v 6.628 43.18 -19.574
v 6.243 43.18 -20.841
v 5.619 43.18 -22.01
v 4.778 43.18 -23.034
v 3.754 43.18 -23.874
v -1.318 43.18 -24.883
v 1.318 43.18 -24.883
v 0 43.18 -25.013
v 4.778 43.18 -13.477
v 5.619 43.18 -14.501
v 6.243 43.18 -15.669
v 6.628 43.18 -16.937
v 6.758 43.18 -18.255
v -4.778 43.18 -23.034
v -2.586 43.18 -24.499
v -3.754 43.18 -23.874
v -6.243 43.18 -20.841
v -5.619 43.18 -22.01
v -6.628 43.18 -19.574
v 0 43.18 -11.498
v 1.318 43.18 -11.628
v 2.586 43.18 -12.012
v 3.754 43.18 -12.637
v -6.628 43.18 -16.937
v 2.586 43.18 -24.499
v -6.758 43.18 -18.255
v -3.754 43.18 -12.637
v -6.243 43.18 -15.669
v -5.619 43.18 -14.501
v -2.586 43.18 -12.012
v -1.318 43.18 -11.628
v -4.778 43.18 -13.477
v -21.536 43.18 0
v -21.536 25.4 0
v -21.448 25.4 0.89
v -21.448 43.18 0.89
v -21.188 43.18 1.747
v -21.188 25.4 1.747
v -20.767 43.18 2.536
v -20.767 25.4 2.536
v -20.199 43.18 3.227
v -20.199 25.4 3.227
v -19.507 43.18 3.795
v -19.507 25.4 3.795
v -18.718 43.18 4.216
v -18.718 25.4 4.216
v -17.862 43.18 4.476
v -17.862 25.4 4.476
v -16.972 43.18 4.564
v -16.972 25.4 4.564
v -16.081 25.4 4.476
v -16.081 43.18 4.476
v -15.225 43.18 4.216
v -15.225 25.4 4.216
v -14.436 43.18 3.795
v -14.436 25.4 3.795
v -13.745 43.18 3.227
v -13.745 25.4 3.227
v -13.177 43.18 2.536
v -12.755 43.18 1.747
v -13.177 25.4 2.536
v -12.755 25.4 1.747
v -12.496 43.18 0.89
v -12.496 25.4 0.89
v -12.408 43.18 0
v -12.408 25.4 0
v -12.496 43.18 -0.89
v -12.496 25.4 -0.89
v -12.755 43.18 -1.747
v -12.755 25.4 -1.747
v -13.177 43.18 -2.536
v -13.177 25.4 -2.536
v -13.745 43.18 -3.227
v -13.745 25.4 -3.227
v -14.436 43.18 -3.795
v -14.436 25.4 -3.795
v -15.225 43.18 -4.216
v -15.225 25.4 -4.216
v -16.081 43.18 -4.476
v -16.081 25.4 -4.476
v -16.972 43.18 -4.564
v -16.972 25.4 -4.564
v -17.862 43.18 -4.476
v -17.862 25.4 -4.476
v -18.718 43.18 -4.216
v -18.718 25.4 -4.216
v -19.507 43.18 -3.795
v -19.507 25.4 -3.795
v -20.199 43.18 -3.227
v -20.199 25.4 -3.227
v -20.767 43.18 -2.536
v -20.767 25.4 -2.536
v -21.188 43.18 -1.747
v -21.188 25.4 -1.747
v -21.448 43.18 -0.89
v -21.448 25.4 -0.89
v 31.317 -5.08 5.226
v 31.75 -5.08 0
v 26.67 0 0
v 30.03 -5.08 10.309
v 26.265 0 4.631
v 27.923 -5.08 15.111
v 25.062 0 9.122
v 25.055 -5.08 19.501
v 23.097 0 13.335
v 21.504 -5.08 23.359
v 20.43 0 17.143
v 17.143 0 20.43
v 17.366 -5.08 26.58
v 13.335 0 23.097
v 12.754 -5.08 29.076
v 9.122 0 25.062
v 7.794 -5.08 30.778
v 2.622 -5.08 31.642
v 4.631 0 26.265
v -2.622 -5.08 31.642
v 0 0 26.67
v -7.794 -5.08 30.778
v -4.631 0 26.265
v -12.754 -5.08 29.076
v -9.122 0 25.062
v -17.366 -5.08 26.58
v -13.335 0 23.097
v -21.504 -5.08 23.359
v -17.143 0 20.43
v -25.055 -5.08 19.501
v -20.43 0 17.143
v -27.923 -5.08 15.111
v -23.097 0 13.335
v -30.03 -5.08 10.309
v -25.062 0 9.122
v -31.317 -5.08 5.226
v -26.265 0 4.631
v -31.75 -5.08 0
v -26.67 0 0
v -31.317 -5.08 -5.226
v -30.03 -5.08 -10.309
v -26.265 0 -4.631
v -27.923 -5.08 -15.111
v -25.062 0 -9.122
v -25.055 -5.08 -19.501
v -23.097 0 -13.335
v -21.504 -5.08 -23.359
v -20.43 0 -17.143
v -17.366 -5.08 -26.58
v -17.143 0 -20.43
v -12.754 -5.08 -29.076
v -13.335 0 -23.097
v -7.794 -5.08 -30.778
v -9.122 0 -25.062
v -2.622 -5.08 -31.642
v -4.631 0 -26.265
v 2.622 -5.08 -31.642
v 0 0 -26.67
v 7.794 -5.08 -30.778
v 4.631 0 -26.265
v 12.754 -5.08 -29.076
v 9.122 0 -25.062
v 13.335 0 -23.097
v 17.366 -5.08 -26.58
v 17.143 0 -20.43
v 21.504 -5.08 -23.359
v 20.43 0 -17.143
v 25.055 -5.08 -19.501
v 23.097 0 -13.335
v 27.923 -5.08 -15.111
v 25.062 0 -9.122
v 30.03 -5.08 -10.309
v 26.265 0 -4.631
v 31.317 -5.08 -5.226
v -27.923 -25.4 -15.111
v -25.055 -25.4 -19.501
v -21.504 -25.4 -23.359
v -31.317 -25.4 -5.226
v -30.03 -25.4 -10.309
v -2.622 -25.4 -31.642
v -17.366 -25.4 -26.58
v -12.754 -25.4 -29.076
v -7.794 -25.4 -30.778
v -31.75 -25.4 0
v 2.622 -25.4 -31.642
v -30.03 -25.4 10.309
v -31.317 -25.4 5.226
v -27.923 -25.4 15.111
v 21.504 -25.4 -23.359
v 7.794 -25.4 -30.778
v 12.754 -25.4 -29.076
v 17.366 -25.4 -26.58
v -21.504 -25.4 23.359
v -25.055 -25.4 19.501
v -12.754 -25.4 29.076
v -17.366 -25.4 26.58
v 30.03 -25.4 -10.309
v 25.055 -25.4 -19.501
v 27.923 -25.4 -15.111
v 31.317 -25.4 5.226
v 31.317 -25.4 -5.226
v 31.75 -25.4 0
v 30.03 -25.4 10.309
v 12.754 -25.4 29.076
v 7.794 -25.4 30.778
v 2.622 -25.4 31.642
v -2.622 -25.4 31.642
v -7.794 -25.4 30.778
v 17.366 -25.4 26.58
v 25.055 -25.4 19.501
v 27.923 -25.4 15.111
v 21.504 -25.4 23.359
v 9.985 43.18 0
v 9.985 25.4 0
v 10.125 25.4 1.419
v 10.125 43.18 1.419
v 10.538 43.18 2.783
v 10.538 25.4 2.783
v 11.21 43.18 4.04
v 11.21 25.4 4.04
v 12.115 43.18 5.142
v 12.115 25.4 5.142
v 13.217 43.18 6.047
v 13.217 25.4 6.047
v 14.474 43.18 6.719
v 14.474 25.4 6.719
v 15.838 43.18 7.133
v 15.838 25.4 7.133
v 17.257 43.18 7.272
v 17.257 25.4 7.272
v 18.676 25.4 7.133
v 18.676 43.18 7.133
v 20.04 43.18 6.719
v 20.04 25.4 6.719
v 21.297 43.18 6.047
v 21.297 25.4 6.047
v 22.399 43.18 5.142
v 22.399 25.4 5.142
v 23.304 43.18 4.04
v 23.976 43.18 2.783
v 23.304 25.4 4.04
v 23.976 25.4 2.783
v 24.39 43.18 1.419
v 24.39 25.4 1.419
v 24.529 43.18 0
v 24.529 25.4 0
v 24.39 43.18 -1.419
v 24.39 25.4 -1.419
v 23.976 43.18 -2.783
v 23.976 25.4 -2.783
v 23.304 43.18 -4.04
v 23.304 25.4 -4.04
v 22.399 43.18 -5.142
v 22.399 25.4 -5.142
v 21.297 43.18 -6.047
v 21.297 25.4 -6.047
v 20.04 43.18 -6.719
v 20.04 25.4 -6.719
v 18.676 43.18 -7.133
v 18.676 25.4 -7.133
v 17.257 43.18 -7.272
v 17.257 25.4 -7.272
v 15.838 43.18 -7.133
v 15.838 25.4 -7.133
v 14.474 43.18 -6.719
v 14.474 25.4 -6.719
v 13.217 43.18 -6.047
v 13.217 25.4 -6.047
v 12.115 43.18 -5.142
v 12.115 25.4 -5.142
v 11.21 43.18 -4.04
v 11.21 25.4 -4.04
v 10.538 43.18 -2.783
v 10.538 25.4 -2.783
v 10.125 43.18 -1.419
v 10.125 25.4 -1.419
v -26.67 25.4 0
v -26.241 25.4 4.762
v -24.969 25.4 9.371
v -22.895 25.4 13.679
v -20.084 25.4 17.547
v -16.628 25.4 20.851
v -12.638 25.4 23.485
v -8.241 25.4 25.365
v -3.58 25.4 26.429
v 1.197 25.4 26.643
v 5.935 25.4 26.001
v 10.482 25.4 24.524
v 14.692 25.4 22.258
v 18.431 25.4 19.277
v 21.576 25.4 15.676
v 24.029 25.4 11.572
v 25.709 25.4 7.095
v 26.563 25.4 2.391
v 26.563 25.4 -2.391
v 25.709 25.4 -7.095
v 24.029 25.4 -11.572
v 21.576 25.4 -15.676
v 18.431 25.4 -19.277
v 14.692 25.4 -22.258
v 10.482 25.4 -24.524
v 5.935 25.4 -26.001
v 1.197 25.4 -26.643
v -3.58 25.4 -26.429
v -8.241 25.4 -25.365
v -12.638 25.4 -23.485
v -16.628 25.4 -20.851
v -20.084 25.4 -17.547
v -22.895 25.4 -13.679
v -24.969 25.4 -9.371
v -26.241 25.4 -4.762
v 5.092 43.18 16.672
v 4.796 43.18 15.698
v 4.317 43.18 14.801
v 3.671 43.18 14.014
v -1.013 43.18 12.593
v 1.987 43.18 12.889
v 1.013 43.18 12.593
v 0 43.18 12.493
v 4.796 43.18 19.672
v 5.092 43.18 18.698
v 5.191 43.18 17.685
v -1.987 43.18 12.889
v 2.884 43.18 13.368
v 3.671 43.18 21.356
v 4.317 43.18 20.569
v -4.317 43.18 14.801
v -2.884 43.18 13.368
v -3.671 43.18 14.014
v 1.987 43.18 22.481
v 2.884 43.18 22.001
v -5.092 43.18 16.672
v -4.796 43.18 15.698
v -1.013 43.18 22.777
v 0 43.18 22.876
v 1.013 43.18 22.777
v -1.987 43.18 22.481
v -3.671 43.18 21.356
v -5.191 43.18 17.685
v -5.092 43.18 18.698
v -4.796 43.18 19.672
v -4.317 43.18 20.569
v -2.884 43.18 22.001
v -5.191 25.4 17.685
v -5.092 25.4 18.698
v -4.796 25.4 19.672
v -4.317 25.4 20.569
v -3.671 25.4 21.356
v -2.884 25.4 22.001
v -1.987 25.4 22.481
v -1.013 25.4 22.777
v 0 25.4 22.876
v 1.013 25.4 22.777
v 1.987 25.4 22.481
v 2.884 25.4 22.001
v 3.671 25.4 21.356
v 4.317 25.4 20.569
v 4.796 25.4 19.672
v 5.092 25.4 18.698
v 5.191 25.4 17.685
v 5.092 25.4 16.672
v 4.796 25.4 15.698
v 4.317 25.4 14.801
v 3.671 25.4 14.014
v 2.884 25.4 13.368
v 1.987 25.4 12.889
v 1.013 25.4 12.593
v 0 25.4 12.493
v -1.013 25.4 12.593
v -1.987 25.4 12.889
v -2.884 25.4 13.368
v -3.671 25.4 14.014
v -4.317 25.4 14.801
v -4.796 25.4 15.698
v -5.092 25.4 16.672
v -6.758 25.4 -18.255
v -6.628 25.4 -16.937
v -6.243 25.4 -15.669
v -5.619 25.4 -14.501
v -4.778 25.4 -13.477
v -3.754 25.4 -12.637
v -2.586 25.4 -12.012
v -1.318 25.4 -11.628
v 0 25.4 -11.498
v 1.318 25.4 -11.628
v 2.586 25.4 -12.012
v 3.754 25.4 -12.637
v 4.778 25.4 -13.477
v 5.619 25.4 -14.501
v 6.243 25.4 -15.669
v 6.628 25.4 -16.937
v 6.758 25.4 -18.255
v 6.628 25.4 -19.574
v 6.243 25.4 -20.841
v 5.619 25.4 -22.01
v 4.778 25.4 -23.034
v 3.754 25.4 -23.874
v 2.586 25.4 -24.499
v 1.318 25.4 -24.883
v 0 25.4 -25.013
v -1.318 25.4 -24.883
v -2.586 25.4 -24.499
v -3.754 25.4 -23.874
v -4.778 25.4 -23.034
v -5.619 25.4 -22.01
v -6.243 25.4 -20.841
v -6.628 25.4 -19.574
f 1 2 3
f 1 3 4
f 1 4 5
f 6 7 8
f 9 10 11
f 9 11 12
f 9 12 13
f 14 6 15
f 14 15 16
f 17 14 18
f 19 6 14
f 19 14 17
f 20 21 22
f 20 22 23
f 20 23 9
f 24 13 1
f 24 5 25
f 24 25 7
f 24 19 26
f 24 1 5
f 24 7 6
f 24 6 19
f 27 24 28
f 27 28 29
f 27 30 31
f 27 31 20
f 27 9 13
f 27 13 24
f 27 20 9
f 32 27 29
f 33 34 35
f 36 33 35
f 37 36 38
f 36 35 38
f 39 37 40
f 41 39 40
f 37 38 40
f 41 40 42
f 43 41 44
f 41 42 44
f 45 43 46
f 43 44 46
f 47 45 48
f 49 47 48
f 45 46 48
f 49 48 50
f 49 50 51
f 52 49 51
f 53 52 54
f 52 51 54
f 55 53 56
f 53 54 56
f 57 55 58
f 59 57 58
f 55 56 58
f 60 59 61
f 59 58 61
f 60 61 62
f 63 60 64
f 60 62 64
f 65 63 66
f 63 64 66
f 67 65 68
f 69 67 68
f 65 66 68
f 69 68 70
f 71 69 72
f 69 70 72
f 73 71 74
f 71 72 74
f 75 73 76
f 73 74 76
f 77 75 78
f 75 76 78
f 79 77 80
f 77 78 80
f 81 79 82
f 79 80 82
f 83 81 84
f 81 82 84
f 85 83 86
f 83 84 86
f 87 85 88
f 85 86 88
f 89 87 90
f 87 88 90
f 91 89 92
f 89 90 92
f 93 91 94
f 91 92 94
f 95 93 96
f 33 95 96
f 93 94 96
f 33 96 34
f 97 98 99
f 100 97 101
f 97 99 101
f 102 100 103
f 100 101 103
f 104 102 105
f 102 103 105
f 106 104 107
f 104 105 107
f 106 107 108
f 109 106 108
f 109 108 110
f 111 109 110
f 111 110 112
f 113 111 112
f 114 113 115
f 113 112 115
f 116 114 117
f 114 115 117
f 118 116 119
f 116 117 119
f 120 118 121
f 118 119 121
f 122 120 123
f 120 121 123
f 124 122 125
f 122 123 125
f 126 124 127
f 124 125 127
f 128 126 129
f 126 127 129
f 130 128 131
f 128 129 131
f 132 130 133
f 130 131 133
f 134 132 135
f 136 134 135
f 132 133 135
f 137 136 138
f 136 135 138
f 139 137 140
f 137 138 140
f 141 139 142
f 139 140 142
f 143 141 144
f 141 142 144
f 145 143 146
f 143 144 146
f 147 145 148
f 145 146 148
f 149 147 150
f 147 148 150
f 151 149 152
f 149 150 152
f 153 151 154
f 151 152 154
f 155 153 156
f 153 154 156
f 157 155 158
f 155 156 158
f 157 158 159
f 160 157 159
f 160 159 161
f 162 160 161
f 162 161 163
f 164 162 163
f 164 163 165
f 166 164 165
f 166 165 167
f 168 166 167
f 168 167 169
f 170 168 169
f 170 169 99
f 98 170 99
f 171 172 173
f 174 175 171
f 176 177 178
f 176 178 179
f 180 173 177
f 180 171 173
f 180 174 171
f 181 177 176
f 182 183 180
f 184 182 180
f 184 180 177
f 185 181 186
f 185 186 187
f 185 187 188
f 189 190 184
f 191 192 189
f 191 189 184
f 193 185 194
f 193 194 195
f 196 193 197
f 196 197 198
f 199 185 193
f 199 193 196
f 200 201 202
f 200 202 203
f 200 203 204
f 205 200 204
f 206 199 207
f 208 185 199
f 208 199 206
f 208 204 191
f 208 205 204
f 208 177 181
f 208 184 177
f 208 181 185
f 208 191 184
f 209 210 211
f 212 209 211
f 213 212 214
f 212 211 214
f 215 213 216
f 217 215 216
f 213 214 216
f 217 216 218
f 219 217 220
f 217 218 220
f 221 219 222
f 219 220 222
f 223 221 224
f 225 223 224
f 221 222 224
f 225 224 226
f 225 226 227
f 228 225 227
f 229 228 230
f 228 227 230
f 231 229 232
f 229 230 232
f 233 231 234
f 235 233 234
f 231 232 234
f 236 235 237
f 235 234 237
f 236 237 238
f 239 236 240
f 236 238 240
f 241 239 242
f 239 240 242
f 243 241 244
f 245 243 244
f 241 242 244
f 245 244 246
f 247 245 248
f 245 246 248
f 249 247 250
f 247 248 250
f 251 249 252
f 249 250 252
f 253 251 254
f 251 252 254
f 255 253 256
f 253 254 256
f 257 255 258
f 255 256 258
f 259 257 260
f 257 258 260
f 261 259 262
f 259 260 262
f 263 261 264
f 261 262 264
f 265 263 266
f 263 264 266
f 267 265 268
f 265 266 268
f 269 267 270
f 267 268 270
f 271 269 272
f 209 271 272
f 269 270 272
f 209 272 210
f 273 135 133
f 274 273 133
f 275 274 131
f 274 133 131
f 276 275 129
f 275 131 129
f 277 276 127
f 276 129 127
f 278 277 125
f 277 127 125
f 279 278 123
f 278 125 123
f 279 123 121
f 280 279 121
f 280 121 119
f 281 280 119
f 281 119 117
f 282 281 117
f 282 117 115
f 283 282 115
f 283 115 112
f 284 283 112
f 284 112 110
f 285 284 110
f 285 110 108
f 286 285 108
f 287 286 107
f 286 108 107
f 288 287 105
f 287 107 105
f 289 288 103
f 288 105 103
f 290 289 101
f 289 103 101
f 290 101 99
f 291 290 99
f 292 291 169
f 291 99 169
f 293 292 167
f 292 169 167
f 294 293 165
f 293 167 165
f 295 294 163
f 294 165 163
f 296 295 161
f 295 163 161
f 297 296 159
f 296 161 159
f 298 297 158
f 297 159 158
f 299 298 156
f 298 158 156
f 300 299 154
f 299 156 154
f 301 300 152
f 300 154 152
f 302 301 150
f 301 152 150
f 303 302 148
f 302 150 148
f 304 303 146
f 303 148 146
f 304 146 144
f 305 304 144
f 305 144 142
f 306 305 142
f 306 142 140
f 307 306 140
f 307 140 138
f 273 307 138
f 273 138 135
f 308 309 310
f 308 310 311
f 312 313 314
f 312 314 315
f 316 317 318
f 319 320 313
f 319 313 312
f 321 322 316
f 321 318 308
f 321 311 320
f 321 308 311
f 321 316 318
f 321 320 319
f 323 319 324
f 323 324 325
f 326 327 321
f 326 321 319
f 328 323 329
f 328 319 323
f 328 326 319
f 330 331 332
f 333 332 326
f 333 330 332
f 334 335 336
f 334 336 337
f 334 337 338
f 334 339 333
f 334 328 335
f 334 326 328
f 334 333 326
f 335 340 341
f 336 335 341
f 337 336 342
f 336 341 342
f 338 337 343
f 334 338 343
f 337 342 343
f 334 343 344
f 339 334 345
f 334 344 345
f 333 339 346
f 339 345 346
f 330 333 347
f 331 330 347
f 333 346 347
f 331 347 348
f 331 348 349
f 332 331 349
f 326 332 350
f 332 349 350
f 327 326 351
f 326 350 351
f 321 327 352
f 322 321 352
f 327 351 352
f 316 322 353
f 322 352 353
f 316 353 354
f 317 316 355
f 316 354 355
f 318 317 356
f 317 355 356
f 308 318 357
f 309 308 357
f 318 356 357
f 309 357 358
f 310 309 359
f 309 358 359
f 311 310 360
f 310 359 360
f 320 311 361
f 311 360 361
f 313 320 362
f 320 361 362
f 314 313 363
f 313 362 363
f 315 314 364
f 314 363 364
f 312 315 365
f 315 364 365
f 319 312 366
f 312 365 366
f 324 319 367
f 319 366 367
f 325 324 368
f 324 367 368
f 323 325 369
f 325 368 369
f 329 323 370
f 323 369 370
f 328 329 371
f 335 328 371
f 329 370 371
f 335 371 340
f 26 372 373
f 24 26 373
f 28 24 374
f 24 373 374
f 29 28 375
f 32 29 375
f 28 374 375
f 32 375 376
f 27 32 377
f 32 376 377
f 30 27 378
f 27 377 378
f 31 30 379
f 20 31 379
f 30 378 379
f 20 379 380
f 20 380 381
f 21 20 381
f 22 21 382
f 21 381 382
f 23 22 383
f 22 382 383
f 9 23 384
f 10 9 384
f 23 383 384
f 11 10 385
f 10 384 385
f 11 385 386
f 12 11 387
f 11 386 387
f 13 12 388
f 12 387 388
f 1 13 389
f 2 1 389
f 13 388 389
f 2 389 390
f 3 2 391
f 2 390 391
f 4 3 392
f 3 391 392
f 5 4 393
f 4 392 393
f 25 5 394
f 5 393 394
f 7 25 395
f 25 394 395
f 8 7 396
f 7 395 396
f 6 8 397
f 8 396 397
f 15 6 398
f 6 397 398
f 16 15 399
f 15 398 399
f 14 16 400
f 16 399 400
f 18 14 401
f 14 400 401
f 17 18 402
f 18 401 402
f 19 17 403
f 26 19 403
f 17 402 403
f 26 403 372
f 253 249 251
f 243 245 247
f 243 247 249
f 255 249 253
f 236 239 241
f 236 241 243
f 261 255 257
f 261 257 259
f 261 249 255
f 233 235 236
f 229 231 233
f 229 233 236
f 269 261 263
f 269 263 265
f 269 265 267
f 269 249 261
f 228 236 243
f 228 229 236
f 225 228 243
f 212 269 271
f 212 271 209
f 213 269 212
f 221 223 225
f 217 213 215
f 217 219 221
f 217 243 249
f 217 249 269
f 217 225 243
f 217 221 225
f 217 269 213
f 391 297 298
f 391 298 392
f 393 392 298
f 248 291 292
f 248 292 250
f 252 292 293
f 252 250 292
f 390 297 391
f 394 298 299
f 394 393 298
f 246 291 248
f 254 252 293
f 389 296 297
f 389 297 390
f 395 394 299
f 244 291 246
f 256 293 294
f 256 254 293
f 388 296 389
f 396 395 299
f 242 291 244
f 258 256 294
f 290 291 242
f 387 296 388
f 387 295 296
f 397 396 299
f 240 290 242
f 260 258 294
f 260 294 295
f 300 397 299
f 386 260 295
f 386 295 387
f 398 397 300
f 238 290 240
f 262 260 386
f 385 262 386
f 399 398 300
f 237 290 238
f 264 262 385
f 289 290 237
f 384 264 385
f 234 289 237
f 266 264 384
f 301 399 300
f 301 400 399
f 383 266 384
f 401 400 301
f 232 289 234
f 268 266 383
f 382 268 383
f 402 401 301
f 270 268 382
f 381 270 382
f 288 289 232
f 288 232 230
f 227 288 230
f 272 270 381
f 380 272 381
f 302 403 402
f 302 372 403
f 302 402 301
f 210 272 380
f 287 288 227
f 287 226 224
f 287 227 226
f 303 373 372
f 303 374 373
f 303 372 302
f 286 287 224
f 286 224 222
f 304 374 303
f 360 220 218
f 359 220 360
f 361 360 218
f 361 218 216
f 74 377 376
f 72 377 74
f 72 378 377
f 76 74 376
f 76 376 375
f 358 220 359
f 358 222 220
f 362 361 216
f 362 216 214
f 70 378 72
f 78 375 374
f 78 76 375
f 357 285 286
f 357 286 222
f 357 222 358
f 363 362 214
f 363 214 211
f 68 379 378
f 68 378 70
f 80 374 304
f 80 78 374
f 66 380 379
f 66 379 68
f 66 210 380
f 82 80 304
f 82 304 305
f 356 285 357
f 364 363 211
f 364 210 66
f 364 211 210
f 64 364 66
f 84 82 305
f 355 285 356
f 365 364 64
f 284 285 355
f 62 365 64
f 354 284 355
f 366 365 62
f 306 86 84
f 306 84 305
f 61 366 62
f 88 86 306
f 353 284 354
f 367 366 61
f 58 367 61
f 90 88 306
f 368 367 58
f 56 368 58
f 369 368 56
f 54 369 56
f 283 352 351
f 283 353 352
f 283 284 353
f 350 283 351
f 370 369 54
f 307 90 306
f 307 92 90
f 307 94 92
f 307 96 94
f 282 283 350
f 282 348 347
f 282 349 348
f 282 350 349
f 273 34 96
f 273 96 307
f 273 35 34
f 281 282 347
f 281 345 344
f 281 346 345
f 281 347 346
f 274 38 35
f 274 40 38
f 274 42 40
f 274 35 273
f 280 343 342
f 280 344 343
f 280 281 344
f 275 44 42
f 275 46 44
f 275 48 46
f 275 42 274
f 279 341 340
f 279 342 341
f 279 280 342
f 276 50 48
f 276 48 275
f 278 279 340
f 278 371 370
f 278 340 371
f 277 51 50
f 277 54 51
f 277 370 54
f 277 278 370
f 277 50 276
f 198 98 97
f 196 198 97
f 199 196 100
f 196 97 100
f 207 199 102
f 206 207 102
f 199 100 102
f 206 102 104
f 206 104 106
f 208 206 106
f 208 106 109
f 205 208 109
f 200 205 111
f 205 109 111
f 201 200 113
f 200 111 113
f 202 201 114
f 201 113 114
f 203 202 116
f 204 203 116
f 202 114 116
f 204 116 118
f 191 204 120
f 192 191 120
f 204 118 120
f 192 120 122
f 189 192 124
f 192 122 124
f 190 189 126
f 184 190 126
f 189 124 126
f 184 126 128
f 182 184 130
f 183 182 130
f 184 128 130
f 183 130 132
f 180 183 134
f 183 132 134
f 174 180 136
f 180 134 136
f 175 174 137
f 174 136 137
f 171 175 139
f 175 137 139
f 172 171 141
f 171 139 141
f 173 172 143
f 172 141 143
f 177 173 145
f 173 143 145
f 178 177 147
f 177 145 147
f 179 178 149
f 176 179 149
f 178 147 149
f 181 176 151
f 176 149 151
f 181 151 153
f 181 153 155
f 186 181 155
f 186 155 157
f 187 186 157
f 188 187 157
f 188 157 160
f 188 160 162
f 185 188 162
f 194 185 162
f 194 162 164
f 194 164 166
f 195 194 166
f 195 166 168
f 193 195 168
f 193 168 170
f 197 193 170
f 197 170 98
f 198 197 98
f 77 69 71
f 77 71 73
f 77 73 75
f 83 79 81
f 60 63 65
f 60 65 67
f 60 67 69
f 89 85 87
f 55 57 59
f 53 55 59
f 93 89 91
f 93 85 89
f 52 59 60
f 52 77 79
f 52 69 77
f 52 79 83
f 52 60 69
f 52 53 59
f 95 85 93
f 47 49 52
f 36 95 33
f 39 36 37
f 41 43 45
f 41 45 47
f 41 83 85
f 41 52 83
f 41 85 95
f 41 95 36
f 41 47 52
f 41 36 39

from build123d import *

# Parameters (mm, degrees)
F0_R     = 31.75
F1_DEPTH = 25.4
F3_SIZE  = 5.08
F4_R     = 26.67
F5_DEPTH = 25.4
F6_R     = 5.19146
F6_R_2   = 7.272236
F6_R_3   = 6.757556
F6_R_4   = 4.56385
F7_DEPTH = 17.78


with BuildPart() as f1:
    # F0 (on Front) → F1 (new body)
    with BuildSketch(Plane.XZ):
        Circle(F0_R)
    extrude(amount=F1_DEPTH)

    # F3
    f3_edges = [f1.edges().sort_by_distance(p)[0] for p in [
        (-31.75, 0, 0),
    ]]
    chamfer(f3_edges, length=F3_SIZE)

    # F4 (on face) → F5 (join)
    with BuildSketch(Plane(origin=(0, 0, 0), x_dir=(-1, 0, 0), z_dir=(0, 1, 0))):
        Circle(F4_R)
    extrude(amount=F5_DEPTH)

    # F6 (on face) → F7 (join)
    with BuildSketch(Plane(origin=(0, 25.4, 0), x_dir=(-1, 0, 0), z_dir=(0, 1, 0))):
        with Locations((0, 17.68492)):
            Circle(F6_R)
        with Locations((-17.257057, 0)):
            Circle(F6_R_2)
        with Locations((0, -18.255401)):
            Circle(F6_R_3)
        with Locations((16.971817, 0)):
            Circle(F6_R_4)
    extrude(amount=F7_DEPTH)


solid = f1.part
